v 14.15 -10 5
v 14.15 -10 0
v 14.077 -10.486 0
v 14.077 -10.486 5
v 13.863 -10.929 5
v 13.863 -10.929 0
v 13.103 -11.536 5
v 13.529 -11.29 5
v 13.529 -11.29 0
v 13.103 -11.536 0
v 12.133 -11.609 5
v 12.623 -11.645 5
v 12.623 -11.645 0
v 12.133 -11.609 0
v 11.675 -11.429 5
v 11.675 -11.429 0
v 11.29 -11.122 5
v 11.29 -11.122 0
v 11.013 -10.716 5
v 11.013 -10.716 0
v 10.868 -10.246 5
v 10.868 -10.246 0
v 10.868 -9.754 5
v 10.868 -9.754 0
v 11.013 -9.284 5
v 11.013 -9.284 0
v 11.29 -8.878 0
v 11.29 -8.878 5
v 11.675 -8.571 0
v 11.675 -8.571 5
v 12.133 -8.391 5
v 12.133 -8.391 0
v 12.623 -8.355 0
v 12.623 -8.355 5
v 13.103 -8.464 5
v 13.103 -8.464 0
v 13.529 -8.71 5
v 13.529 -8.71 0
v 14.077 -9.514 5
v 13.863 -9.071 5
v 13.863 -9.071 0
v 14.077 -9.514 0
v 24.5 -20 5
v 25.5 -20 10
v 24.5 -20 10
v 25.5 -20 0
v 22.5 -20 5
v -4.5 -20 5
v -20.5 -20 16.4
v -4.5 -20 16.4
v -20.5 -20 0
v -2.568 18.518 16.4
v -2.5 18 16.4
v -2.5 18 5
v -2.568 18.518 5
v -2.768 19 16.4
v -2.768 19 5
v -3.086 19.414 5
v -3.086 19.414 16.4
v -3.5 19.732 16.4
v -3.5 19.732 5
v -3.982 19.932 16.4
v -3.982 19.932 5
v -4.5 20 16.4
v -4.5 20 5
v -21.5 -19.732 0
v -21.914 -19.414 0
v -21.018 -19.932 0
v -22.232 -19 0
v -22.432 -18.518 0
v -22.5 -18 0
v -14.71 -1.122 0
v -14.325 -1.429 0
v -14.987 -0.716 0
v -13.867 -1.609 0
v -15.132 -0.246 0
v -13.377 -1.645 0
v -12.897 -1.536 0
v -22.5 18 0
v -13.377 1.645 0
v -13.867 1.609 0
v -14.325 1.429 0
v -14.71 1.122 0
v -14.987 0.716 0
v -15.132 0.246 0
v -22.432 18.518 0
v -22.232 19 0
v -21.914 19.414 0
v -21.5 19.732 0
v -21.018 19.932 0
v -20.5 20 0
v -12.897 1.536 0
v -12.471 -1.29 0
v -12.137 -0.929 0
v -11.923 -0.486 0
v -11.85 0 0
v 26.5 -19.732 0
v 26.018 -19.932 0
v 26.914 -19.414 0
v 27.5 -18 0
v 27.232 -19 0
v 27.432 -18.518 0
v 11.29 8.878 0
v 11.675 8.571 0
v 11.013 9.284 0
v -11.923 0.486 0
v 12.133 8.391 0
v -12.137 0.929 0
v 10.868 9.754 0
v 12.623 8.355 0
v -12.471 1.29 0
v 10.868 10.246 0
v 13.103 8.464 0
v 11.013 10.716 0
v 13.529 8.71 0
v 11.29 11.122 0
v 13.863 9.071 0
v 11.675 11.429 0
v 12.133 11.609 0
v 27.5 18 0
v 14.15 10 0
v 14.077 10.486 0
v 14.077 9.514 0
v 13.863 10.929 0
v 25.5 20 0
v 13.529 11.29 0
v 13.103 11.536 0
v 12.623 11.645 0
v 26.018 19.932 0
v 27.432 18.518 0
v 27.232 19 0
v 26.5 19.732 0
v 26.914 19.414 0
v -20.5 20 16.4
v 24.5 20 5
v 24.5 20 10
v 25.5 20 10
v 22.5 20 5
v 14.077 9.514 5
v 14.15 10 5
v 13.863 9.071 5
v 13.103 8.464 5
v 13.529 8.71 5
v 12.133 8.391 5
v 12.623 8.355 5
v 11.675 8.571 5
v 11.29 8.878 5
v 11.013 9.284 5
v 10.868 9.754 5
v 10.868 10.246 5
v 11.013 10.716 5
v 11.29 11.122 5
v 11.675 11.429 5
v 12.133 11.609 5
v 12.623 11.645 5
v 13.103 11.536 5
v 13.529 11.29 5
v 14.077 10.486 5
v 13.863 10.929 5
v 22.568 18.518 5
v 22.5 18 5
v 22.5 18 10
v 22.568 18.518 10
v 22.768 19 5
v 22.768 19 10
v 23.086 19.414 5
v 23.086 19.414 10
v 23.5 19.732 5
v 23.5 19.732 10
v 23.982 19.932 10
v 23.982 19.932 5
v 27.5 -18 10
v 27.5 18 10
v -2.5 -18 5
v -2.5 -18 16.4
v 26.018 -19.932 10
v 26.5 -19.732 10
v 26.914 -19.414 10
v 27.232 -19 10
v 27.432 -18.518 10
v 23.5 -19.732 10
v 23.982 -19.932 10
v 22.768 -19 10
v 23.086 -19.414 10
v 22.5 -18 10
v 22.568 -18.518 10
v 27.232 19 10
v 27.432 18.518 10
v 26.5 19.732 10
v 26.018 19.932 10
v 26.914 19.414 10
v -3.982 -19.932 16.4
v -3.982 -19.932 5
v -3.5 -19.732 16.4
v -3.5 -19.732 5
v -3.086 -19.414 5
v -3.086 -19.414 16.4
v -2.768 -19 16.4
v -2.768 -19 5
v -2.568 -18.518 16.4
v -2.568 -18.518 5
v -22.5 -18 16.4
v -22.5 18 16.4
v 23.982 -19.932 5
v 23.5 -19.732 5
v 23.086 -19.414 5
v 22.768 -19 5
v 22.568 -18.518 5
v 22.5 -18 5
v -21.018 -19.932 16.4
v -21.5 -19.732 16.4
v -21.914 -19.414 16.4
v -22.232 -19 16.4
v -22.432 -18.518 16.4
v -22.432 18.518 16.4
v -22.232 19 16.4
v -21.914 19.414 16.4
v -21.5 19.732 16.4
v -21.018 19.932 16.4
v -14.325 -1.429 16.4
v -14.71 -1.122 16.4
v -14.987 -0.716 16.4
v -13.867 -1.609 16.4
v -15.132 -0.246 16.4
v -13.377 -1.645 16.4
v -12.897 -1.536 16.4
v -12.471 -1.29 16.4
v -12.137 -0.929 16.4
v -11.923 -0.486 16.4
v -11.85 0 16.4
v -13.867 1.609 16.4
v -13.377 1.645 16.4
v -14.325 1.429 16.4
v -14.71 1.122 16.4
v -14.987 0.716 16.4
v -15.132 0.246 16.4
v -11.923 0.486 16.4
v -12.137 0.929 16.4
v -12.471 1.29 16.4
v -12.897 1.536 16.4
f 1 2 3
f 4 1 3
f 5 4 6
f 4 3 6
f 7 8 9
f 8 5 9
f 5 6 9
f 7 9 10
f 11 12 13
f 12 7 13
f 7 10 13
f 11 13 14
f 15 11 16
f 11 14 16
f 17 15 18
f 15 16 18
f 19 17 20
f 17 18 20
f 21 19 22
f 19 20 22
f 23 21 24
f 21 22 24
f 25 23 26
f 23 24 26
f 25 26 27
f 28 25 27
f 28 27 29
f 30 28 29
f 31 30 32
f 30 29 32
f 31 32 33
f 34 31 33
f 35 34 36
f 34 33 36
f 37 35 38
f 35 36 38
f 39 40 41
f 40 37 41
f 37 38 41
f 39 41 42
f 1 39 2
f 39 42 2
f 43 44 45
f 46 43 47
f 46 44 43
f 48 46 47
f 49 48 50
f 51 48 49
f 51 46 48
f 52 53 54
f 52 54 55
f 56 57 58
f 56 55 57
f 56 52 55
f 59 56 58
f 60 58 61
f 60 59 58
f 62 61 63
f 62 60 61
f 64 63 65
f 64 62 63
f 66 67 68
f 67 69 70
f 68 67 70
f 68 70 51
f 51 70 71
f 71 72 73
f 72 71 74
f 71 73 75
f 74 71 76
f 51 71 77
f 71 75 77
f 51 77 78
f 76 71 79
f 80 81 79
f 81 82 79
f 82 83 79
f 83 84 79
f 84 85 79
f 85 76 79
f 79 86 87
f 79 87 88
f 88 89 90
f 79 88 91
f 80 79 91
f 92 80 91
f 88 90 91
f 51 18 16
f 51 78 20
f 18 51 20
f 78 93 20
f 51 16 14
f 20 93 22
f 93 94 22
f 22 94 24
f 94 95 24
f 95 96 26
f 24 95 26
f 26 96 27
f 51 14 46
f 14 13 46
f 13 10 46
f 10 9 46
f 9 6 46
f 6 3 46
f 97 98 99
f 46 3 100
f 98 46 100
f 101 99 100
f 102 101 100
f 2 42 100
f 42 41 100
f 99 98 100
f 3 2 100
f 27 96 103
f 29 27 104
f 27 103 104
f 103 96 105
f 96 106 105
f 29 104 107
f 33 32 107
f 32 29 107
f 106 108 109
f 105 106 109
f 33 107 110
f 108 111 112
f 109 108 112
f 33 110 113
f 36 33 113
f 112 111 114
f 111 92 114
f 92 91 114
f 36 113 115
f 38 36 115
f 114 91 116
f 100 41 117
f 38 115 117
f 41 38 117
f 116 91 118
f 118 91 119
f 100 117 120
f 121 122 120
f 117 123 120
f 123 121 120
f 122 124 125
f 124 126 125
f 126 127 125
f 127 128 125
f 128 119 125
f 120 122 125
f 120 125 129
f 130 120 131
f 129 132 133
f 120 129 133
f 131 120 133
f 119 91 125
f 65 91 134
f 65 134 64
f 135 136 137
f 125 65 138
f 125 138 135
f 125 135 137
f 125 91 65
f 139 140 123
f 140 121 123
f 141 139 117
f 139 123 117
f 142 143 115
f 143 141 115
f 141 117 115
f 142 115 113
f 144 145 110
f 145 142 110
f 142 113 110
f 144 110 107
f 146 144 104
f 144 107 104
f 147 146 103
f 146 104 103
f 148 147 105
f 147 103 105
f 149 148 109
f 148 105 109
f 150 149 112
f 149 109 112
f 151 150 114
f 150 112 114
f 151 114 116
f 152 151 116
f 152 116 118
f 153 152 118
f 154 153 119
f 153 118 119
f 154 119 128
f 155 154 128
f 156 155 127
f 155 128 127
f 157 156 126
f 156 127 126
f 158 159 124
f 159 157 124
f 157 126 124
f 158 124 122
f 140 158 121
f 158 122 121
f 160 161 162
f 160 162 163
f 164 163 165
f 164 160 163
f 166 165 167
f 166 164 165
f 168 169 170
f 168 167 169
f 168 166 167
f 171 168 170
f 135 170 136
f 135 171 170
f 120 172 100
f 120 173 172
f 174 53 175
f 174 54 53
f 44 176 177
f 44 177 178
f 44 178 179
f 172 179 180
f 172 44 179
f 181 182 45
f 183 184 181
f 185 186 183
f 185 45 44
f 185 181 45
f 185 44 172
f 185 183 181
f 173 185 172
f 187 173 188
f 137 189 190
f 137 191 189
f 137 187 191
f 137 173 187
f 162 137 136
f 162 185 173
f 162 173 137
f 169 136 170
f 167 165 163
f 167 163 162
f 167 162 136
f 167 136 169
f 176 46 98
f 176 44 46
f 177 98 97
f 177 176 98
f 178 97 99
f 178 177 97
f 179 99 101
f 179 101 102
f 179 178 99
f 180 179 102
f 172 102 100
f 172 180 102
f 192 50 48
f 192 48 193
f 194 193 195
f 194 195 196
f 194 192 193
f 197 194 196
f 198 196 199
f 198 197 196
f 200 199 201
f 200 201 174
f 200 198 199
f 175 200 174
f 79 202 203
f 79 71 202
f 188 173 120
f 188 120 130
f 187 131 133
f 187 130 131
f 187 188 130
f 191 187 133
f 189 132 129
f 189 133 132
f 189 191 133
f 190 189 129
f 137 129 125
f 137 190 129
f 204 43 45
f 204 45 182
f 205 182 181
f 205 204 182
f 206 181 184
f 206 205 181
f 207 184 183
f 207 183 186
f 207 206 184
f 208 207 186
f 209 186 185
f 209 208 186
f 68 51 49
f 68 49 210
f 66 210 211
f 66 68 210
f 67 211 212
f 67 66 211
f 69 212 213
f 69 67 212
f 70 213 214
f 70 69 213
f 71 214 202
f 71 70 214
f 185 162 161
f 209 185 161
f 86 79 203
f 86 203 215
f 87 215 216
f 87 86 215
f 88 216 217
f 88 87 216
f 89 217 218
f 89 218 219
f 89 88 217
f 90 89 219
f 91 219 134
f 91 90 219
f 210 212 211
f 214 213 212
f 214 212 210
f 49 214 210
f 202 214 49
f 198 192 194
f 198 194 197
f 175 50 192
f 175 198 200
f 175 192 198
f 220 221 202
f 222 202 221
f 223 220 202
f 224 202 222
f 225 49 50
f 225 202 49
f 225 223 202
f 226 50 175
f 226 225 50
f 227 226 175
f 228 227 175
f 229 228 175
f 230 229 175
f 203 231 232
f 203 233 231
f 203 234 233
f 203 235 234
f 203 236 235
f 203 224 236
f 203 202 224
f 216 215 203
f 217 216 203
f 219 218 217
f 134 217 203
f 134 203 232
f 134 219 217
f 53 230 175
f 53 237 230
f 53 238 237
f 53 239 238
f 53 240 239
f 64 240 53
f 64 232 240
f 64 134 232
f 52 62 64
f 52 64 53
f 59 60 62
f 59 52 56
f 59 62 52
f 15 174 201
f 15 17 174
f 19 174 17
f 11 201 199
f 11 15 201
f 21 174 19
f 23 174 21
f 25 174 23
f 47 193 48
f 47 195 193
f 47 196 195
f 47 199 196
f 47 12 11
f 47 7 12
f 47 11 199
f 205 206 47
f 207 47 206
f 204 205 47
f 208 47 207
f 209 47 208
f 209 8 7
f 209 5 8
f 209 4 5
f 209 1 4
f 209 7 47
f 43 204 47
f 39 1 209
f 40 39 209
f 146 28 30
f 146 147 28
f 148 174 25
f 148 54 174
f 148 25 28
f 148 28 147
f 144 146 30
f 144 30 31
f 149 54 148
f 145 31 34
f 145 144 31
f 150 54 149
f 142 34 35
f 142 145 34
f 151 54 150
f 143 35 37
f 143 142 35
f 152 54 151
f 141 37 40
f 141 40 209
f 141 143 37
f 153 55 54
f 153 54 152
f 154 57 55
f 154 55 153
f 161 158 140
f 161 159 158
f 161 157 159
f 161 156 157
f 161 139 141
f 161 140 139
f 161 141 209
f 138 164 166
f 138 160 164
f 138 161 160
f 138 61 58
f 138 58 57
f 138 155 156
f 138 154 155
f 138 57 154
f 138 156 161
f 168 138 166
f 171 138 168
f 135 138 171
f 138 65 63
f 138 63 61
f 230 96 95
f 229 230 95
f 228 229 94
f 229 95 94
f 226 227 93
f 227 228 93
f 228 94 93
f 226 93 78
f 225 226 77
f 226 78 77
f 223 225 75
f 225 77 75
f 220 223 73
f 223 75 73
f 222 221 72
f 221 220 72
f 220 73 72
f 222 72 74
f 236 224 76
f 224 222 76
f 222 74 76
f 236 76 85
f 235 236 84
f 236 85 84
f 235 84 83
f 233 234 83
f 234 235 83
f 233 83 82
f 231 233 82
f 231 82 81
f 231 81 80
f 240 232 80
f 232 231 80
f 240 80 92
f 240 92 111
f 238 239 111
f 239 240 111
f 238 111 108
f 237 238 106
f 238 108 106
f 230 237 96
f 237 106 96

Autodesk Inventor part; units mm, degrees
ref_plane "YZ Plane" through (0, 0, 0) normal (1, 0, 0) x (0, 1, 0)
ref_plane "XZ Plane" through (0, 0, 0) normal (0, 1, 0) x (-1, 0, 0)
ref_plane "XY Plane" through (0, 0, 0) normal (0, 0, 1) x (1, 0, 0)
sketch "スケッチ1" plane through (0, 0, 0) normal (0, 0, 1) x (1, 0, 0)
  line L0 (22.5, -20) -> (-22.5, -20)
  line L1 (-22.5, -20) -> (-22.5, 20)
  line L2 (-22.5, 20) -> (22.5, 20)
  line L3 (22.5, 20) -> (22.5, -20)
  line L4 (22.5, -20) -> (-22.5, 20) construction
  line L5 (-22.5, -20) -> (22.5, 20) construction
  circle A0 centre (12.5, 10) radius 1.65
  circle A1 centre (12.5, -10) radius 1.65
  circle A2 centre (-13.5, 0) radius 1.65
  point P0 (0, 0)
  dimension "d0" = 45
  dimension "d1" = 40
  dimension "d2" = 3.3
  dimension "d3" = 3.3
  dimension "d4" = 10
  dimension "d5" = 10
  dimension "d6" = 10
  dimension "d7" = 10
  dimension "d8" = 3.3
  dimension "d9" = 36
  dimension "d10" = 20
extrude "押し出し1" add sketch "スケッチ1" along normal blind 5
sketch "スケッチ2" plane through (0, 0, 5) normal (0, 0, 1) x (1, 0, 0)
  line L0 (22.5, 20) -> (-22.5, 20) projected
  line L1 (-22.5, 20) -> (-22.5, -20) projected
  line L2 (-22.5, -20) -> (22.5, -20) projected
  line L3 (22.5, -20) -> (22.5, 20) projected
  circle A0 centre (-13.5, 0) radius 1.65 projected
  circle A1 centre (12.5, -10) radius 1.65 projected
  circle A2 centre (12.5, 10) radius 1.65 projected
  line L4 (-22.5, 20) -> (0, 20)
  line L5 (0, 20) -> (0, -20)
  line L6 (0, -20) -> (-22.5, -20)
  line L7 (-22.5, -20) -> (-22.5, 20)
  line L8 (22.5, 20) -> (-22.5, 20) projected
  line L9 (-2.5, 20) -> (-2.5, -20)
  point P0 (0, 0)
  point P1 (-2.5, -20)
  dimension "d15" = 20
extrude "押し出し2" add sketch "スケッチ2" along normal blind 11.4 contours L9 L2 L1 L0
fillet "フィレット1" radius 2 4 edges at (-22.5, 20, 8.2) (-22.5, -20, 8.2) (-2.5, -20, 10.7) (-2.5, 20, 10.7)
sketch "スケッチ3" plane through (22.5, -20, 0) normal (1, 0, 0) x (0, 0, -1)
  line L0 (0, 0) -> (0, 40) projected
  line L1 (0, 40) -> (-5, 40) projected
  line L2 (-5, 0) -> (-5, 40) projected
  line L3 (0, 0) -> (-5, 0) projected
  line L4 (-5, 40) -> (-16.4, 40) projected
  line L5 (0, 0) -> (-10, 0)
  line L6 (-10, 0) -> (-10, 40)
  line L7 (-10, 40) -> (0, 40)
  line L8 (0, 40) -> (0, 0)
  point P0 (0, 20)
  dimension "d17" = 10
extrude "押し出し3" add sketch "スケッチ3" along normal blind 5
fillet "フィレット2" radius 2 4 edges at (27.5, 20, 5) (27.5, -20, 5) (22.5, 20, 7.5) (22.5, -20, 7.5)
properties part number "soroban_hold"
